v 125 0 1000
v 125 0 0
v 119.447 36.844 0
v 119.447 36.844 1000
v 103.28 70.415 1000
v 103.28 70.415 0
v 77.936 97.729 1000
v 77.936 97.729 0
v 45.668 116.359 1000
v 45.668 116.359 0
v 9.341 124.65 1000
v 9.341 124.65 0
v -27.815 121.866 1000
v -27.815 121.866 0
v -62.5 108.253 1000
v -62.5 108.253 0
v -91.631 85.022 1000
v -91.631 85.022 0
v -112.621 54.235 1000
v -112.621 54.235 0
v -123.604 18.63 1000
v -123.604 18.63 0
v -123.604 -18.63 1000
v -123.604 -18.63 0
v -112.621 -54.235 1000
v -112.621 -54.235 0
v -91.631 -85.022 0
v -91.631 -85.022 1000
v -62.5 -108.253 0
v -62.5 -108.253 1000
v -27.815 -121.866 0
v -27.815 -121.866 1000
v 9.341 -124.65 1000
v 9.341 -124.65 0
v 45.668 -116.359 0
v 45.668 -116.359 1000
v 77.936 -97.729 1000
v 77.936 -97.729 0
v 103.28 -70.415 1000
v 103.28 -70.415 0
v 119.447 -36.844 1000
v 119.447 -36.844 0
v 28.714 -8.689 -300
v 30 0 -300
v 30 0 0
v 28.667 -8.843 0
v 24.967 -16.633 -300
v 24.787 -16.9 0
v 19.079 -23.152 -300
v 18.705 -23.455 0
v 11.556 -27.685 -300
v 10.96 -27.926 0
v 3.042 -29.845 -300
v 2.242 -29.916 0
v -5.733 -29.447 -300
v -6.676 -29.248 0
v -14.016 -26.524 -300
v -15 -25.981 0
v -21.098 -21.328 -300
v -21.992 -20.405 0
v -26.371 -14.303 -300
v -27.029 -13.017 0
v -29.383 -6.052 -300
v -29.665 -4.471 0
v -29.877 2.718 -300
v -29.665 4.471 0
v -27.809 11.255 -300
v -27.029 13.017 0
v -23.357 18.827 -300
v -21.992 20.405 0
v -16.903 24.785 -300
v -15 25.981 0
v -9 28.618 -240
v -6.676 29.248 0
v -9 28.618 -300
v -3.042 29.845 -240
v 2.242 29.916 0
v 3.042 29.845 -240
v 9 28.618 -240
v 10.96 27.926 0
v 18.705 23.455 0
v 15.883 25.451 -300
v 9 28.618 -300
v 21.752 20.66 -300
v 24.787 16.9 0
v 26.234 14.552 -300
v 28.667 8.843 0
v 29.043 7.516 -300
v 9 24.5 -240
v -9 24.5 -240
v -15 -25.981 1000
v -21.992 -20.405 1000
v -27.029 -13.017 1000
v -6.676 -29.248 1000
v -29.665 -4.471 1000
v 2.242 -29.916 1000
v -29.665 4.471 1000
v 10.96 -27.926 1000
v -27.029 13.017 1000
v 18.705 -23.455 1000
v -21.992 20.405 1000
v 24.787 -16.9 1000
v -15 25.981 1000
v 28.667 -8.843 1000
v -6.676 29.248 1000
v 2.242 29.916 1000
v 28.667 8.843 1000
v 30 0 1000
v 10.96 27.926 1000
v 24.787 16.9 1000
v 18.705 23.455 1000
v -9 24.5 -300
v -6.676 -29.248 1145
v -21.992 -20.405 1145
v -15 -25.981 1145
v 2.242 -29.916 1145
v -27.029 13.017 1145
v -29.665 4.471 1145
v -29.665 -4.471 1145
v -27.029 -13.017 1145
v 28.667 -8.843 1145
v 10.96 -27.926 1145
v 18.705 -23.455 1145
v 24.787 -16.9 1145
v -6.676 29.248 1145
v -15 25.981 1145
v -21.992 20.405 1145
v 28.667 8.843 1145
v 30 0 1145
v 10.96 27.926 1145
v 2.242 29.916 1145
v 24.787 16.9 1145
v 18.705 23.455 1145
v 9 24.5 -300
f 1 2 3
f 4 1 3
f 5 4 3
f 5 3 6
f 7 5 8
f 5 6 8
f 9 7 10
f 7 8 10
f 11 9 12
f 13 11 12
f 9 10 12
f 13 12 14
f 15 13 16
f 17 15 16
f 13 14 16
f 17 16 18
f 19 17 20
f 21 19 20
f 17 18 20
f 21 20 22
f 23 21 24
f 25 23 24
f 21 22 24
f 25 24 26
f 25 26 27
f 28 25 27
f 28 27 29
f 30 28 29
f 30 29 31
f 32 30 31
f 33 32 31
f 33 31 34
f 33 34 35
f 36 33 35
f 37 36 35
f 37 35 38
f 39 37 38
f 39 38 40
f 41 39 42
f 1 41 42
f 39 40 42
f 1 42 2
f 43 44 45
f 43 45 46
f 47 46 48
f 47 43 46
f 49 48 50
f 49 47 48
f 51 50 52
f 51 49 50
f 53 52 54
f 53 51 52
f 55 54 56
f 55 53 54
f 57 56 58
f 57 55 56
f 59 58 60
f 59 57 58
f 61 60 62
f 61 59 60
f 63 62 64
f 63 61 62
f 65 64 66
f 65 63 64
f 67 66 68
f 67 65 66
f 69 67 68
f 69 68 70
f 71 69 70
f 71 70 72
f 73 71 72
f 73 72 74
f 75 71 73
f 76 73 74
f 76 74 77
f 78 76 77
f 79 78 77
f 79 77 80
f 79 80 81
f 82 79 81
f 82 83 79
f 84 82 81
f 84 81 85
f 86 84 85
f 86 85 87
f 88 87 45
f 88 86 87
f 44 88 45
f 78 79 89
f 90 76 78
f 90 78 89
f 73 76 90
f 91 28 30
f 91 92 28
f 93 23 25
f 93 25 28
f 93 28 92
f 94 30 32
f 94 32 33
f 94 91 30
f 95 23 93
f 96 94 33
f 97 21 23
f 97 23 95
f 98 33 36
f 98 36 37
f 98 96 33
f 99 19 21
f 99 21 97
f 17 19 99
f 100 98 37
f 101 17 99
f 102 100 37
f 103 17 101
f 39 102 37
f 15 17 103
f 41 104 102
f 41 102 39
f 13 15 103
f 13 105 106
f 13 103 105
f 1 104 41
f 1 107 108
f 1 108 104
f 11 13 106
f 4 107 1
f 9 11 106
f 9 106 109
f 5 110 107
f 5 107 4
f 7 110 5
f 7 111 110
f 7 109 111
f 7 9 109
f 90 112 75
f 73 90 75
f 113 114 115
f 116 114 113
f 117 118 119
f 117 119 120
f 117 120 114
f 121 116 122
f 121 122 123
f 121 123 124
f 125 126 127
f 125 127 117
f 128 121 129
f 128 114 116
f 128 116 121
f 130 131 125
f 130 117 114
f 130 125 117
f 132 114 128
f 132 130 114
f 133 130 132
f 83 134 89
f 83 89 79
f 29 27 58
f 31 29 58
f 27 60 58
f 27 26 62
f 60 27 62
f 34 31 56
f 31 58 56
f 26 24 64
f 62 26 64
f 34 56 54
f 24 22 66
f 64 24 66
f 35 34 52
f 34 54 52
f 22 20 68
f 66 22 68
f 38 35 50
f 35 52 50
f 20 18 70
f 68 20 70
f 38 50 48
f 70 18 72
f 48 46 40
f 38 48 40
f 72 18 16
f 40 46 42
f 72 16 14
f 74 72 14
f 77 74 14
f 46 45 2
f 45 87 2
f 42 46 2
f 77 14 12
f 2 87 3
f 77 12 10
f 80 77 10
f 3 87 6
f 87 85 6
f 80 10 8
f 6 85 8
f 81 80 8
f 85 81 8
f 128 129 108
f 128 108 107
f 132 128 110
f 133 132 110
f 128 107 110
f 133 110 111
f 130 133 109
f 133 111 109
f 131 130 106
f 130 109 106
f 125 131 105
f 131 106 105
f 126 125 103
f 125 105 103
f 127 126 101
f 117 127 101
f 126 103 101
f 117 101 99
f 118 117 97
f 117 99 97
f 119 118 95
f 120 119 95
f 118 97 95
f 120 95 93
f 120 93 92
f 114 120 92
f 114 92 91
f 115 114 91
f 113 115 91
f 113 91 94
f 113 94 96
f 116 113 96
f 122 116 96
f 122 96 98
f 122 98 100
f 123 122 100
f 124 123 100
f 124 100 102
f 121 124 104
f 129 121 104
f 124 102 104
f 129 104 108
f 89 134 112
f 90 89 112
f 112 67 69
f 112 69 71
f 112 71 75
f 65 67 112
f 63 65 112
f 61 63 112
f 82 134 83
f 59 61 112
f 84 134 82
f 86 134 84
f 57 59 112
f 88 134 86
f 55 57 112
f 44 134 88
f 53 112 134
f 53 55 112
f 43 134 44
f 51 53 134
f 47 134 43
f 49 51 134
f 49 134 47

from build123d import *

# Parameters (mm, degrees)
SKETCH2_R           = 125
BOSS_EXTRUDE1_DEPTH = 1000
SKETCH7_R           = 30
BOSS_EXTRUDE3_DEPTH = 145
BOSS_EXTRUDE4_START = 300
SKETCH8_R           = 30
BOSS_EXTRUDE4_DEPTH = 300
SKETCH9_W           = 18
SKETCH9_H           = 11
CUT_EXTRUDE1_DEPTH  = 60


with BuildPart() as part:
    # Sketch2 → Boss-Extrude1 (new body)
    with BuildSketch(Plane.XY):
        Circle(SKETCH2_R)
    extrude(amount=BOSS_EXTRUDE1_DEPTH)

    # Sketch7 → Boss-Extrude3 (add)
    with BuildSketch(Plane.XY.offset(1000)):
        Circle(SKETCH7_R)
    extrude(amount=BOSS_EXTRUDE3_DEPTH)

    # Sketch8 → Boss-Extrude4 (add)
    with BuildSketch(Plane(origin=(0, 0, 0), x_dir=(-1, 0, 0), z_dir=(0, 0, -1)).offset(BOSS_EXTRUDE4_START)):
        with Locations(Location((0, 0, 0), (0, 0, 180))):
            Circle(SKETCH8_R)
    extrude(amount=-BOSS_EXTRUDE4_DEPTH)

    # Sketch9 → Cut-Extrude1 (cut)
    with BuildSketch(Plane(origin=(0, 0, -300), x_dir=(-1, 0, 0), z_dir=(0, 0, -1))):
        with Locations((0, 30)):
            Rectangle(SKETCH9_W, SKETCH9_H)
    extrude(amount=-CUT_EXTRUDE1_DEPTH, mode=Mode.SUBTRACT)


solid = part.part
